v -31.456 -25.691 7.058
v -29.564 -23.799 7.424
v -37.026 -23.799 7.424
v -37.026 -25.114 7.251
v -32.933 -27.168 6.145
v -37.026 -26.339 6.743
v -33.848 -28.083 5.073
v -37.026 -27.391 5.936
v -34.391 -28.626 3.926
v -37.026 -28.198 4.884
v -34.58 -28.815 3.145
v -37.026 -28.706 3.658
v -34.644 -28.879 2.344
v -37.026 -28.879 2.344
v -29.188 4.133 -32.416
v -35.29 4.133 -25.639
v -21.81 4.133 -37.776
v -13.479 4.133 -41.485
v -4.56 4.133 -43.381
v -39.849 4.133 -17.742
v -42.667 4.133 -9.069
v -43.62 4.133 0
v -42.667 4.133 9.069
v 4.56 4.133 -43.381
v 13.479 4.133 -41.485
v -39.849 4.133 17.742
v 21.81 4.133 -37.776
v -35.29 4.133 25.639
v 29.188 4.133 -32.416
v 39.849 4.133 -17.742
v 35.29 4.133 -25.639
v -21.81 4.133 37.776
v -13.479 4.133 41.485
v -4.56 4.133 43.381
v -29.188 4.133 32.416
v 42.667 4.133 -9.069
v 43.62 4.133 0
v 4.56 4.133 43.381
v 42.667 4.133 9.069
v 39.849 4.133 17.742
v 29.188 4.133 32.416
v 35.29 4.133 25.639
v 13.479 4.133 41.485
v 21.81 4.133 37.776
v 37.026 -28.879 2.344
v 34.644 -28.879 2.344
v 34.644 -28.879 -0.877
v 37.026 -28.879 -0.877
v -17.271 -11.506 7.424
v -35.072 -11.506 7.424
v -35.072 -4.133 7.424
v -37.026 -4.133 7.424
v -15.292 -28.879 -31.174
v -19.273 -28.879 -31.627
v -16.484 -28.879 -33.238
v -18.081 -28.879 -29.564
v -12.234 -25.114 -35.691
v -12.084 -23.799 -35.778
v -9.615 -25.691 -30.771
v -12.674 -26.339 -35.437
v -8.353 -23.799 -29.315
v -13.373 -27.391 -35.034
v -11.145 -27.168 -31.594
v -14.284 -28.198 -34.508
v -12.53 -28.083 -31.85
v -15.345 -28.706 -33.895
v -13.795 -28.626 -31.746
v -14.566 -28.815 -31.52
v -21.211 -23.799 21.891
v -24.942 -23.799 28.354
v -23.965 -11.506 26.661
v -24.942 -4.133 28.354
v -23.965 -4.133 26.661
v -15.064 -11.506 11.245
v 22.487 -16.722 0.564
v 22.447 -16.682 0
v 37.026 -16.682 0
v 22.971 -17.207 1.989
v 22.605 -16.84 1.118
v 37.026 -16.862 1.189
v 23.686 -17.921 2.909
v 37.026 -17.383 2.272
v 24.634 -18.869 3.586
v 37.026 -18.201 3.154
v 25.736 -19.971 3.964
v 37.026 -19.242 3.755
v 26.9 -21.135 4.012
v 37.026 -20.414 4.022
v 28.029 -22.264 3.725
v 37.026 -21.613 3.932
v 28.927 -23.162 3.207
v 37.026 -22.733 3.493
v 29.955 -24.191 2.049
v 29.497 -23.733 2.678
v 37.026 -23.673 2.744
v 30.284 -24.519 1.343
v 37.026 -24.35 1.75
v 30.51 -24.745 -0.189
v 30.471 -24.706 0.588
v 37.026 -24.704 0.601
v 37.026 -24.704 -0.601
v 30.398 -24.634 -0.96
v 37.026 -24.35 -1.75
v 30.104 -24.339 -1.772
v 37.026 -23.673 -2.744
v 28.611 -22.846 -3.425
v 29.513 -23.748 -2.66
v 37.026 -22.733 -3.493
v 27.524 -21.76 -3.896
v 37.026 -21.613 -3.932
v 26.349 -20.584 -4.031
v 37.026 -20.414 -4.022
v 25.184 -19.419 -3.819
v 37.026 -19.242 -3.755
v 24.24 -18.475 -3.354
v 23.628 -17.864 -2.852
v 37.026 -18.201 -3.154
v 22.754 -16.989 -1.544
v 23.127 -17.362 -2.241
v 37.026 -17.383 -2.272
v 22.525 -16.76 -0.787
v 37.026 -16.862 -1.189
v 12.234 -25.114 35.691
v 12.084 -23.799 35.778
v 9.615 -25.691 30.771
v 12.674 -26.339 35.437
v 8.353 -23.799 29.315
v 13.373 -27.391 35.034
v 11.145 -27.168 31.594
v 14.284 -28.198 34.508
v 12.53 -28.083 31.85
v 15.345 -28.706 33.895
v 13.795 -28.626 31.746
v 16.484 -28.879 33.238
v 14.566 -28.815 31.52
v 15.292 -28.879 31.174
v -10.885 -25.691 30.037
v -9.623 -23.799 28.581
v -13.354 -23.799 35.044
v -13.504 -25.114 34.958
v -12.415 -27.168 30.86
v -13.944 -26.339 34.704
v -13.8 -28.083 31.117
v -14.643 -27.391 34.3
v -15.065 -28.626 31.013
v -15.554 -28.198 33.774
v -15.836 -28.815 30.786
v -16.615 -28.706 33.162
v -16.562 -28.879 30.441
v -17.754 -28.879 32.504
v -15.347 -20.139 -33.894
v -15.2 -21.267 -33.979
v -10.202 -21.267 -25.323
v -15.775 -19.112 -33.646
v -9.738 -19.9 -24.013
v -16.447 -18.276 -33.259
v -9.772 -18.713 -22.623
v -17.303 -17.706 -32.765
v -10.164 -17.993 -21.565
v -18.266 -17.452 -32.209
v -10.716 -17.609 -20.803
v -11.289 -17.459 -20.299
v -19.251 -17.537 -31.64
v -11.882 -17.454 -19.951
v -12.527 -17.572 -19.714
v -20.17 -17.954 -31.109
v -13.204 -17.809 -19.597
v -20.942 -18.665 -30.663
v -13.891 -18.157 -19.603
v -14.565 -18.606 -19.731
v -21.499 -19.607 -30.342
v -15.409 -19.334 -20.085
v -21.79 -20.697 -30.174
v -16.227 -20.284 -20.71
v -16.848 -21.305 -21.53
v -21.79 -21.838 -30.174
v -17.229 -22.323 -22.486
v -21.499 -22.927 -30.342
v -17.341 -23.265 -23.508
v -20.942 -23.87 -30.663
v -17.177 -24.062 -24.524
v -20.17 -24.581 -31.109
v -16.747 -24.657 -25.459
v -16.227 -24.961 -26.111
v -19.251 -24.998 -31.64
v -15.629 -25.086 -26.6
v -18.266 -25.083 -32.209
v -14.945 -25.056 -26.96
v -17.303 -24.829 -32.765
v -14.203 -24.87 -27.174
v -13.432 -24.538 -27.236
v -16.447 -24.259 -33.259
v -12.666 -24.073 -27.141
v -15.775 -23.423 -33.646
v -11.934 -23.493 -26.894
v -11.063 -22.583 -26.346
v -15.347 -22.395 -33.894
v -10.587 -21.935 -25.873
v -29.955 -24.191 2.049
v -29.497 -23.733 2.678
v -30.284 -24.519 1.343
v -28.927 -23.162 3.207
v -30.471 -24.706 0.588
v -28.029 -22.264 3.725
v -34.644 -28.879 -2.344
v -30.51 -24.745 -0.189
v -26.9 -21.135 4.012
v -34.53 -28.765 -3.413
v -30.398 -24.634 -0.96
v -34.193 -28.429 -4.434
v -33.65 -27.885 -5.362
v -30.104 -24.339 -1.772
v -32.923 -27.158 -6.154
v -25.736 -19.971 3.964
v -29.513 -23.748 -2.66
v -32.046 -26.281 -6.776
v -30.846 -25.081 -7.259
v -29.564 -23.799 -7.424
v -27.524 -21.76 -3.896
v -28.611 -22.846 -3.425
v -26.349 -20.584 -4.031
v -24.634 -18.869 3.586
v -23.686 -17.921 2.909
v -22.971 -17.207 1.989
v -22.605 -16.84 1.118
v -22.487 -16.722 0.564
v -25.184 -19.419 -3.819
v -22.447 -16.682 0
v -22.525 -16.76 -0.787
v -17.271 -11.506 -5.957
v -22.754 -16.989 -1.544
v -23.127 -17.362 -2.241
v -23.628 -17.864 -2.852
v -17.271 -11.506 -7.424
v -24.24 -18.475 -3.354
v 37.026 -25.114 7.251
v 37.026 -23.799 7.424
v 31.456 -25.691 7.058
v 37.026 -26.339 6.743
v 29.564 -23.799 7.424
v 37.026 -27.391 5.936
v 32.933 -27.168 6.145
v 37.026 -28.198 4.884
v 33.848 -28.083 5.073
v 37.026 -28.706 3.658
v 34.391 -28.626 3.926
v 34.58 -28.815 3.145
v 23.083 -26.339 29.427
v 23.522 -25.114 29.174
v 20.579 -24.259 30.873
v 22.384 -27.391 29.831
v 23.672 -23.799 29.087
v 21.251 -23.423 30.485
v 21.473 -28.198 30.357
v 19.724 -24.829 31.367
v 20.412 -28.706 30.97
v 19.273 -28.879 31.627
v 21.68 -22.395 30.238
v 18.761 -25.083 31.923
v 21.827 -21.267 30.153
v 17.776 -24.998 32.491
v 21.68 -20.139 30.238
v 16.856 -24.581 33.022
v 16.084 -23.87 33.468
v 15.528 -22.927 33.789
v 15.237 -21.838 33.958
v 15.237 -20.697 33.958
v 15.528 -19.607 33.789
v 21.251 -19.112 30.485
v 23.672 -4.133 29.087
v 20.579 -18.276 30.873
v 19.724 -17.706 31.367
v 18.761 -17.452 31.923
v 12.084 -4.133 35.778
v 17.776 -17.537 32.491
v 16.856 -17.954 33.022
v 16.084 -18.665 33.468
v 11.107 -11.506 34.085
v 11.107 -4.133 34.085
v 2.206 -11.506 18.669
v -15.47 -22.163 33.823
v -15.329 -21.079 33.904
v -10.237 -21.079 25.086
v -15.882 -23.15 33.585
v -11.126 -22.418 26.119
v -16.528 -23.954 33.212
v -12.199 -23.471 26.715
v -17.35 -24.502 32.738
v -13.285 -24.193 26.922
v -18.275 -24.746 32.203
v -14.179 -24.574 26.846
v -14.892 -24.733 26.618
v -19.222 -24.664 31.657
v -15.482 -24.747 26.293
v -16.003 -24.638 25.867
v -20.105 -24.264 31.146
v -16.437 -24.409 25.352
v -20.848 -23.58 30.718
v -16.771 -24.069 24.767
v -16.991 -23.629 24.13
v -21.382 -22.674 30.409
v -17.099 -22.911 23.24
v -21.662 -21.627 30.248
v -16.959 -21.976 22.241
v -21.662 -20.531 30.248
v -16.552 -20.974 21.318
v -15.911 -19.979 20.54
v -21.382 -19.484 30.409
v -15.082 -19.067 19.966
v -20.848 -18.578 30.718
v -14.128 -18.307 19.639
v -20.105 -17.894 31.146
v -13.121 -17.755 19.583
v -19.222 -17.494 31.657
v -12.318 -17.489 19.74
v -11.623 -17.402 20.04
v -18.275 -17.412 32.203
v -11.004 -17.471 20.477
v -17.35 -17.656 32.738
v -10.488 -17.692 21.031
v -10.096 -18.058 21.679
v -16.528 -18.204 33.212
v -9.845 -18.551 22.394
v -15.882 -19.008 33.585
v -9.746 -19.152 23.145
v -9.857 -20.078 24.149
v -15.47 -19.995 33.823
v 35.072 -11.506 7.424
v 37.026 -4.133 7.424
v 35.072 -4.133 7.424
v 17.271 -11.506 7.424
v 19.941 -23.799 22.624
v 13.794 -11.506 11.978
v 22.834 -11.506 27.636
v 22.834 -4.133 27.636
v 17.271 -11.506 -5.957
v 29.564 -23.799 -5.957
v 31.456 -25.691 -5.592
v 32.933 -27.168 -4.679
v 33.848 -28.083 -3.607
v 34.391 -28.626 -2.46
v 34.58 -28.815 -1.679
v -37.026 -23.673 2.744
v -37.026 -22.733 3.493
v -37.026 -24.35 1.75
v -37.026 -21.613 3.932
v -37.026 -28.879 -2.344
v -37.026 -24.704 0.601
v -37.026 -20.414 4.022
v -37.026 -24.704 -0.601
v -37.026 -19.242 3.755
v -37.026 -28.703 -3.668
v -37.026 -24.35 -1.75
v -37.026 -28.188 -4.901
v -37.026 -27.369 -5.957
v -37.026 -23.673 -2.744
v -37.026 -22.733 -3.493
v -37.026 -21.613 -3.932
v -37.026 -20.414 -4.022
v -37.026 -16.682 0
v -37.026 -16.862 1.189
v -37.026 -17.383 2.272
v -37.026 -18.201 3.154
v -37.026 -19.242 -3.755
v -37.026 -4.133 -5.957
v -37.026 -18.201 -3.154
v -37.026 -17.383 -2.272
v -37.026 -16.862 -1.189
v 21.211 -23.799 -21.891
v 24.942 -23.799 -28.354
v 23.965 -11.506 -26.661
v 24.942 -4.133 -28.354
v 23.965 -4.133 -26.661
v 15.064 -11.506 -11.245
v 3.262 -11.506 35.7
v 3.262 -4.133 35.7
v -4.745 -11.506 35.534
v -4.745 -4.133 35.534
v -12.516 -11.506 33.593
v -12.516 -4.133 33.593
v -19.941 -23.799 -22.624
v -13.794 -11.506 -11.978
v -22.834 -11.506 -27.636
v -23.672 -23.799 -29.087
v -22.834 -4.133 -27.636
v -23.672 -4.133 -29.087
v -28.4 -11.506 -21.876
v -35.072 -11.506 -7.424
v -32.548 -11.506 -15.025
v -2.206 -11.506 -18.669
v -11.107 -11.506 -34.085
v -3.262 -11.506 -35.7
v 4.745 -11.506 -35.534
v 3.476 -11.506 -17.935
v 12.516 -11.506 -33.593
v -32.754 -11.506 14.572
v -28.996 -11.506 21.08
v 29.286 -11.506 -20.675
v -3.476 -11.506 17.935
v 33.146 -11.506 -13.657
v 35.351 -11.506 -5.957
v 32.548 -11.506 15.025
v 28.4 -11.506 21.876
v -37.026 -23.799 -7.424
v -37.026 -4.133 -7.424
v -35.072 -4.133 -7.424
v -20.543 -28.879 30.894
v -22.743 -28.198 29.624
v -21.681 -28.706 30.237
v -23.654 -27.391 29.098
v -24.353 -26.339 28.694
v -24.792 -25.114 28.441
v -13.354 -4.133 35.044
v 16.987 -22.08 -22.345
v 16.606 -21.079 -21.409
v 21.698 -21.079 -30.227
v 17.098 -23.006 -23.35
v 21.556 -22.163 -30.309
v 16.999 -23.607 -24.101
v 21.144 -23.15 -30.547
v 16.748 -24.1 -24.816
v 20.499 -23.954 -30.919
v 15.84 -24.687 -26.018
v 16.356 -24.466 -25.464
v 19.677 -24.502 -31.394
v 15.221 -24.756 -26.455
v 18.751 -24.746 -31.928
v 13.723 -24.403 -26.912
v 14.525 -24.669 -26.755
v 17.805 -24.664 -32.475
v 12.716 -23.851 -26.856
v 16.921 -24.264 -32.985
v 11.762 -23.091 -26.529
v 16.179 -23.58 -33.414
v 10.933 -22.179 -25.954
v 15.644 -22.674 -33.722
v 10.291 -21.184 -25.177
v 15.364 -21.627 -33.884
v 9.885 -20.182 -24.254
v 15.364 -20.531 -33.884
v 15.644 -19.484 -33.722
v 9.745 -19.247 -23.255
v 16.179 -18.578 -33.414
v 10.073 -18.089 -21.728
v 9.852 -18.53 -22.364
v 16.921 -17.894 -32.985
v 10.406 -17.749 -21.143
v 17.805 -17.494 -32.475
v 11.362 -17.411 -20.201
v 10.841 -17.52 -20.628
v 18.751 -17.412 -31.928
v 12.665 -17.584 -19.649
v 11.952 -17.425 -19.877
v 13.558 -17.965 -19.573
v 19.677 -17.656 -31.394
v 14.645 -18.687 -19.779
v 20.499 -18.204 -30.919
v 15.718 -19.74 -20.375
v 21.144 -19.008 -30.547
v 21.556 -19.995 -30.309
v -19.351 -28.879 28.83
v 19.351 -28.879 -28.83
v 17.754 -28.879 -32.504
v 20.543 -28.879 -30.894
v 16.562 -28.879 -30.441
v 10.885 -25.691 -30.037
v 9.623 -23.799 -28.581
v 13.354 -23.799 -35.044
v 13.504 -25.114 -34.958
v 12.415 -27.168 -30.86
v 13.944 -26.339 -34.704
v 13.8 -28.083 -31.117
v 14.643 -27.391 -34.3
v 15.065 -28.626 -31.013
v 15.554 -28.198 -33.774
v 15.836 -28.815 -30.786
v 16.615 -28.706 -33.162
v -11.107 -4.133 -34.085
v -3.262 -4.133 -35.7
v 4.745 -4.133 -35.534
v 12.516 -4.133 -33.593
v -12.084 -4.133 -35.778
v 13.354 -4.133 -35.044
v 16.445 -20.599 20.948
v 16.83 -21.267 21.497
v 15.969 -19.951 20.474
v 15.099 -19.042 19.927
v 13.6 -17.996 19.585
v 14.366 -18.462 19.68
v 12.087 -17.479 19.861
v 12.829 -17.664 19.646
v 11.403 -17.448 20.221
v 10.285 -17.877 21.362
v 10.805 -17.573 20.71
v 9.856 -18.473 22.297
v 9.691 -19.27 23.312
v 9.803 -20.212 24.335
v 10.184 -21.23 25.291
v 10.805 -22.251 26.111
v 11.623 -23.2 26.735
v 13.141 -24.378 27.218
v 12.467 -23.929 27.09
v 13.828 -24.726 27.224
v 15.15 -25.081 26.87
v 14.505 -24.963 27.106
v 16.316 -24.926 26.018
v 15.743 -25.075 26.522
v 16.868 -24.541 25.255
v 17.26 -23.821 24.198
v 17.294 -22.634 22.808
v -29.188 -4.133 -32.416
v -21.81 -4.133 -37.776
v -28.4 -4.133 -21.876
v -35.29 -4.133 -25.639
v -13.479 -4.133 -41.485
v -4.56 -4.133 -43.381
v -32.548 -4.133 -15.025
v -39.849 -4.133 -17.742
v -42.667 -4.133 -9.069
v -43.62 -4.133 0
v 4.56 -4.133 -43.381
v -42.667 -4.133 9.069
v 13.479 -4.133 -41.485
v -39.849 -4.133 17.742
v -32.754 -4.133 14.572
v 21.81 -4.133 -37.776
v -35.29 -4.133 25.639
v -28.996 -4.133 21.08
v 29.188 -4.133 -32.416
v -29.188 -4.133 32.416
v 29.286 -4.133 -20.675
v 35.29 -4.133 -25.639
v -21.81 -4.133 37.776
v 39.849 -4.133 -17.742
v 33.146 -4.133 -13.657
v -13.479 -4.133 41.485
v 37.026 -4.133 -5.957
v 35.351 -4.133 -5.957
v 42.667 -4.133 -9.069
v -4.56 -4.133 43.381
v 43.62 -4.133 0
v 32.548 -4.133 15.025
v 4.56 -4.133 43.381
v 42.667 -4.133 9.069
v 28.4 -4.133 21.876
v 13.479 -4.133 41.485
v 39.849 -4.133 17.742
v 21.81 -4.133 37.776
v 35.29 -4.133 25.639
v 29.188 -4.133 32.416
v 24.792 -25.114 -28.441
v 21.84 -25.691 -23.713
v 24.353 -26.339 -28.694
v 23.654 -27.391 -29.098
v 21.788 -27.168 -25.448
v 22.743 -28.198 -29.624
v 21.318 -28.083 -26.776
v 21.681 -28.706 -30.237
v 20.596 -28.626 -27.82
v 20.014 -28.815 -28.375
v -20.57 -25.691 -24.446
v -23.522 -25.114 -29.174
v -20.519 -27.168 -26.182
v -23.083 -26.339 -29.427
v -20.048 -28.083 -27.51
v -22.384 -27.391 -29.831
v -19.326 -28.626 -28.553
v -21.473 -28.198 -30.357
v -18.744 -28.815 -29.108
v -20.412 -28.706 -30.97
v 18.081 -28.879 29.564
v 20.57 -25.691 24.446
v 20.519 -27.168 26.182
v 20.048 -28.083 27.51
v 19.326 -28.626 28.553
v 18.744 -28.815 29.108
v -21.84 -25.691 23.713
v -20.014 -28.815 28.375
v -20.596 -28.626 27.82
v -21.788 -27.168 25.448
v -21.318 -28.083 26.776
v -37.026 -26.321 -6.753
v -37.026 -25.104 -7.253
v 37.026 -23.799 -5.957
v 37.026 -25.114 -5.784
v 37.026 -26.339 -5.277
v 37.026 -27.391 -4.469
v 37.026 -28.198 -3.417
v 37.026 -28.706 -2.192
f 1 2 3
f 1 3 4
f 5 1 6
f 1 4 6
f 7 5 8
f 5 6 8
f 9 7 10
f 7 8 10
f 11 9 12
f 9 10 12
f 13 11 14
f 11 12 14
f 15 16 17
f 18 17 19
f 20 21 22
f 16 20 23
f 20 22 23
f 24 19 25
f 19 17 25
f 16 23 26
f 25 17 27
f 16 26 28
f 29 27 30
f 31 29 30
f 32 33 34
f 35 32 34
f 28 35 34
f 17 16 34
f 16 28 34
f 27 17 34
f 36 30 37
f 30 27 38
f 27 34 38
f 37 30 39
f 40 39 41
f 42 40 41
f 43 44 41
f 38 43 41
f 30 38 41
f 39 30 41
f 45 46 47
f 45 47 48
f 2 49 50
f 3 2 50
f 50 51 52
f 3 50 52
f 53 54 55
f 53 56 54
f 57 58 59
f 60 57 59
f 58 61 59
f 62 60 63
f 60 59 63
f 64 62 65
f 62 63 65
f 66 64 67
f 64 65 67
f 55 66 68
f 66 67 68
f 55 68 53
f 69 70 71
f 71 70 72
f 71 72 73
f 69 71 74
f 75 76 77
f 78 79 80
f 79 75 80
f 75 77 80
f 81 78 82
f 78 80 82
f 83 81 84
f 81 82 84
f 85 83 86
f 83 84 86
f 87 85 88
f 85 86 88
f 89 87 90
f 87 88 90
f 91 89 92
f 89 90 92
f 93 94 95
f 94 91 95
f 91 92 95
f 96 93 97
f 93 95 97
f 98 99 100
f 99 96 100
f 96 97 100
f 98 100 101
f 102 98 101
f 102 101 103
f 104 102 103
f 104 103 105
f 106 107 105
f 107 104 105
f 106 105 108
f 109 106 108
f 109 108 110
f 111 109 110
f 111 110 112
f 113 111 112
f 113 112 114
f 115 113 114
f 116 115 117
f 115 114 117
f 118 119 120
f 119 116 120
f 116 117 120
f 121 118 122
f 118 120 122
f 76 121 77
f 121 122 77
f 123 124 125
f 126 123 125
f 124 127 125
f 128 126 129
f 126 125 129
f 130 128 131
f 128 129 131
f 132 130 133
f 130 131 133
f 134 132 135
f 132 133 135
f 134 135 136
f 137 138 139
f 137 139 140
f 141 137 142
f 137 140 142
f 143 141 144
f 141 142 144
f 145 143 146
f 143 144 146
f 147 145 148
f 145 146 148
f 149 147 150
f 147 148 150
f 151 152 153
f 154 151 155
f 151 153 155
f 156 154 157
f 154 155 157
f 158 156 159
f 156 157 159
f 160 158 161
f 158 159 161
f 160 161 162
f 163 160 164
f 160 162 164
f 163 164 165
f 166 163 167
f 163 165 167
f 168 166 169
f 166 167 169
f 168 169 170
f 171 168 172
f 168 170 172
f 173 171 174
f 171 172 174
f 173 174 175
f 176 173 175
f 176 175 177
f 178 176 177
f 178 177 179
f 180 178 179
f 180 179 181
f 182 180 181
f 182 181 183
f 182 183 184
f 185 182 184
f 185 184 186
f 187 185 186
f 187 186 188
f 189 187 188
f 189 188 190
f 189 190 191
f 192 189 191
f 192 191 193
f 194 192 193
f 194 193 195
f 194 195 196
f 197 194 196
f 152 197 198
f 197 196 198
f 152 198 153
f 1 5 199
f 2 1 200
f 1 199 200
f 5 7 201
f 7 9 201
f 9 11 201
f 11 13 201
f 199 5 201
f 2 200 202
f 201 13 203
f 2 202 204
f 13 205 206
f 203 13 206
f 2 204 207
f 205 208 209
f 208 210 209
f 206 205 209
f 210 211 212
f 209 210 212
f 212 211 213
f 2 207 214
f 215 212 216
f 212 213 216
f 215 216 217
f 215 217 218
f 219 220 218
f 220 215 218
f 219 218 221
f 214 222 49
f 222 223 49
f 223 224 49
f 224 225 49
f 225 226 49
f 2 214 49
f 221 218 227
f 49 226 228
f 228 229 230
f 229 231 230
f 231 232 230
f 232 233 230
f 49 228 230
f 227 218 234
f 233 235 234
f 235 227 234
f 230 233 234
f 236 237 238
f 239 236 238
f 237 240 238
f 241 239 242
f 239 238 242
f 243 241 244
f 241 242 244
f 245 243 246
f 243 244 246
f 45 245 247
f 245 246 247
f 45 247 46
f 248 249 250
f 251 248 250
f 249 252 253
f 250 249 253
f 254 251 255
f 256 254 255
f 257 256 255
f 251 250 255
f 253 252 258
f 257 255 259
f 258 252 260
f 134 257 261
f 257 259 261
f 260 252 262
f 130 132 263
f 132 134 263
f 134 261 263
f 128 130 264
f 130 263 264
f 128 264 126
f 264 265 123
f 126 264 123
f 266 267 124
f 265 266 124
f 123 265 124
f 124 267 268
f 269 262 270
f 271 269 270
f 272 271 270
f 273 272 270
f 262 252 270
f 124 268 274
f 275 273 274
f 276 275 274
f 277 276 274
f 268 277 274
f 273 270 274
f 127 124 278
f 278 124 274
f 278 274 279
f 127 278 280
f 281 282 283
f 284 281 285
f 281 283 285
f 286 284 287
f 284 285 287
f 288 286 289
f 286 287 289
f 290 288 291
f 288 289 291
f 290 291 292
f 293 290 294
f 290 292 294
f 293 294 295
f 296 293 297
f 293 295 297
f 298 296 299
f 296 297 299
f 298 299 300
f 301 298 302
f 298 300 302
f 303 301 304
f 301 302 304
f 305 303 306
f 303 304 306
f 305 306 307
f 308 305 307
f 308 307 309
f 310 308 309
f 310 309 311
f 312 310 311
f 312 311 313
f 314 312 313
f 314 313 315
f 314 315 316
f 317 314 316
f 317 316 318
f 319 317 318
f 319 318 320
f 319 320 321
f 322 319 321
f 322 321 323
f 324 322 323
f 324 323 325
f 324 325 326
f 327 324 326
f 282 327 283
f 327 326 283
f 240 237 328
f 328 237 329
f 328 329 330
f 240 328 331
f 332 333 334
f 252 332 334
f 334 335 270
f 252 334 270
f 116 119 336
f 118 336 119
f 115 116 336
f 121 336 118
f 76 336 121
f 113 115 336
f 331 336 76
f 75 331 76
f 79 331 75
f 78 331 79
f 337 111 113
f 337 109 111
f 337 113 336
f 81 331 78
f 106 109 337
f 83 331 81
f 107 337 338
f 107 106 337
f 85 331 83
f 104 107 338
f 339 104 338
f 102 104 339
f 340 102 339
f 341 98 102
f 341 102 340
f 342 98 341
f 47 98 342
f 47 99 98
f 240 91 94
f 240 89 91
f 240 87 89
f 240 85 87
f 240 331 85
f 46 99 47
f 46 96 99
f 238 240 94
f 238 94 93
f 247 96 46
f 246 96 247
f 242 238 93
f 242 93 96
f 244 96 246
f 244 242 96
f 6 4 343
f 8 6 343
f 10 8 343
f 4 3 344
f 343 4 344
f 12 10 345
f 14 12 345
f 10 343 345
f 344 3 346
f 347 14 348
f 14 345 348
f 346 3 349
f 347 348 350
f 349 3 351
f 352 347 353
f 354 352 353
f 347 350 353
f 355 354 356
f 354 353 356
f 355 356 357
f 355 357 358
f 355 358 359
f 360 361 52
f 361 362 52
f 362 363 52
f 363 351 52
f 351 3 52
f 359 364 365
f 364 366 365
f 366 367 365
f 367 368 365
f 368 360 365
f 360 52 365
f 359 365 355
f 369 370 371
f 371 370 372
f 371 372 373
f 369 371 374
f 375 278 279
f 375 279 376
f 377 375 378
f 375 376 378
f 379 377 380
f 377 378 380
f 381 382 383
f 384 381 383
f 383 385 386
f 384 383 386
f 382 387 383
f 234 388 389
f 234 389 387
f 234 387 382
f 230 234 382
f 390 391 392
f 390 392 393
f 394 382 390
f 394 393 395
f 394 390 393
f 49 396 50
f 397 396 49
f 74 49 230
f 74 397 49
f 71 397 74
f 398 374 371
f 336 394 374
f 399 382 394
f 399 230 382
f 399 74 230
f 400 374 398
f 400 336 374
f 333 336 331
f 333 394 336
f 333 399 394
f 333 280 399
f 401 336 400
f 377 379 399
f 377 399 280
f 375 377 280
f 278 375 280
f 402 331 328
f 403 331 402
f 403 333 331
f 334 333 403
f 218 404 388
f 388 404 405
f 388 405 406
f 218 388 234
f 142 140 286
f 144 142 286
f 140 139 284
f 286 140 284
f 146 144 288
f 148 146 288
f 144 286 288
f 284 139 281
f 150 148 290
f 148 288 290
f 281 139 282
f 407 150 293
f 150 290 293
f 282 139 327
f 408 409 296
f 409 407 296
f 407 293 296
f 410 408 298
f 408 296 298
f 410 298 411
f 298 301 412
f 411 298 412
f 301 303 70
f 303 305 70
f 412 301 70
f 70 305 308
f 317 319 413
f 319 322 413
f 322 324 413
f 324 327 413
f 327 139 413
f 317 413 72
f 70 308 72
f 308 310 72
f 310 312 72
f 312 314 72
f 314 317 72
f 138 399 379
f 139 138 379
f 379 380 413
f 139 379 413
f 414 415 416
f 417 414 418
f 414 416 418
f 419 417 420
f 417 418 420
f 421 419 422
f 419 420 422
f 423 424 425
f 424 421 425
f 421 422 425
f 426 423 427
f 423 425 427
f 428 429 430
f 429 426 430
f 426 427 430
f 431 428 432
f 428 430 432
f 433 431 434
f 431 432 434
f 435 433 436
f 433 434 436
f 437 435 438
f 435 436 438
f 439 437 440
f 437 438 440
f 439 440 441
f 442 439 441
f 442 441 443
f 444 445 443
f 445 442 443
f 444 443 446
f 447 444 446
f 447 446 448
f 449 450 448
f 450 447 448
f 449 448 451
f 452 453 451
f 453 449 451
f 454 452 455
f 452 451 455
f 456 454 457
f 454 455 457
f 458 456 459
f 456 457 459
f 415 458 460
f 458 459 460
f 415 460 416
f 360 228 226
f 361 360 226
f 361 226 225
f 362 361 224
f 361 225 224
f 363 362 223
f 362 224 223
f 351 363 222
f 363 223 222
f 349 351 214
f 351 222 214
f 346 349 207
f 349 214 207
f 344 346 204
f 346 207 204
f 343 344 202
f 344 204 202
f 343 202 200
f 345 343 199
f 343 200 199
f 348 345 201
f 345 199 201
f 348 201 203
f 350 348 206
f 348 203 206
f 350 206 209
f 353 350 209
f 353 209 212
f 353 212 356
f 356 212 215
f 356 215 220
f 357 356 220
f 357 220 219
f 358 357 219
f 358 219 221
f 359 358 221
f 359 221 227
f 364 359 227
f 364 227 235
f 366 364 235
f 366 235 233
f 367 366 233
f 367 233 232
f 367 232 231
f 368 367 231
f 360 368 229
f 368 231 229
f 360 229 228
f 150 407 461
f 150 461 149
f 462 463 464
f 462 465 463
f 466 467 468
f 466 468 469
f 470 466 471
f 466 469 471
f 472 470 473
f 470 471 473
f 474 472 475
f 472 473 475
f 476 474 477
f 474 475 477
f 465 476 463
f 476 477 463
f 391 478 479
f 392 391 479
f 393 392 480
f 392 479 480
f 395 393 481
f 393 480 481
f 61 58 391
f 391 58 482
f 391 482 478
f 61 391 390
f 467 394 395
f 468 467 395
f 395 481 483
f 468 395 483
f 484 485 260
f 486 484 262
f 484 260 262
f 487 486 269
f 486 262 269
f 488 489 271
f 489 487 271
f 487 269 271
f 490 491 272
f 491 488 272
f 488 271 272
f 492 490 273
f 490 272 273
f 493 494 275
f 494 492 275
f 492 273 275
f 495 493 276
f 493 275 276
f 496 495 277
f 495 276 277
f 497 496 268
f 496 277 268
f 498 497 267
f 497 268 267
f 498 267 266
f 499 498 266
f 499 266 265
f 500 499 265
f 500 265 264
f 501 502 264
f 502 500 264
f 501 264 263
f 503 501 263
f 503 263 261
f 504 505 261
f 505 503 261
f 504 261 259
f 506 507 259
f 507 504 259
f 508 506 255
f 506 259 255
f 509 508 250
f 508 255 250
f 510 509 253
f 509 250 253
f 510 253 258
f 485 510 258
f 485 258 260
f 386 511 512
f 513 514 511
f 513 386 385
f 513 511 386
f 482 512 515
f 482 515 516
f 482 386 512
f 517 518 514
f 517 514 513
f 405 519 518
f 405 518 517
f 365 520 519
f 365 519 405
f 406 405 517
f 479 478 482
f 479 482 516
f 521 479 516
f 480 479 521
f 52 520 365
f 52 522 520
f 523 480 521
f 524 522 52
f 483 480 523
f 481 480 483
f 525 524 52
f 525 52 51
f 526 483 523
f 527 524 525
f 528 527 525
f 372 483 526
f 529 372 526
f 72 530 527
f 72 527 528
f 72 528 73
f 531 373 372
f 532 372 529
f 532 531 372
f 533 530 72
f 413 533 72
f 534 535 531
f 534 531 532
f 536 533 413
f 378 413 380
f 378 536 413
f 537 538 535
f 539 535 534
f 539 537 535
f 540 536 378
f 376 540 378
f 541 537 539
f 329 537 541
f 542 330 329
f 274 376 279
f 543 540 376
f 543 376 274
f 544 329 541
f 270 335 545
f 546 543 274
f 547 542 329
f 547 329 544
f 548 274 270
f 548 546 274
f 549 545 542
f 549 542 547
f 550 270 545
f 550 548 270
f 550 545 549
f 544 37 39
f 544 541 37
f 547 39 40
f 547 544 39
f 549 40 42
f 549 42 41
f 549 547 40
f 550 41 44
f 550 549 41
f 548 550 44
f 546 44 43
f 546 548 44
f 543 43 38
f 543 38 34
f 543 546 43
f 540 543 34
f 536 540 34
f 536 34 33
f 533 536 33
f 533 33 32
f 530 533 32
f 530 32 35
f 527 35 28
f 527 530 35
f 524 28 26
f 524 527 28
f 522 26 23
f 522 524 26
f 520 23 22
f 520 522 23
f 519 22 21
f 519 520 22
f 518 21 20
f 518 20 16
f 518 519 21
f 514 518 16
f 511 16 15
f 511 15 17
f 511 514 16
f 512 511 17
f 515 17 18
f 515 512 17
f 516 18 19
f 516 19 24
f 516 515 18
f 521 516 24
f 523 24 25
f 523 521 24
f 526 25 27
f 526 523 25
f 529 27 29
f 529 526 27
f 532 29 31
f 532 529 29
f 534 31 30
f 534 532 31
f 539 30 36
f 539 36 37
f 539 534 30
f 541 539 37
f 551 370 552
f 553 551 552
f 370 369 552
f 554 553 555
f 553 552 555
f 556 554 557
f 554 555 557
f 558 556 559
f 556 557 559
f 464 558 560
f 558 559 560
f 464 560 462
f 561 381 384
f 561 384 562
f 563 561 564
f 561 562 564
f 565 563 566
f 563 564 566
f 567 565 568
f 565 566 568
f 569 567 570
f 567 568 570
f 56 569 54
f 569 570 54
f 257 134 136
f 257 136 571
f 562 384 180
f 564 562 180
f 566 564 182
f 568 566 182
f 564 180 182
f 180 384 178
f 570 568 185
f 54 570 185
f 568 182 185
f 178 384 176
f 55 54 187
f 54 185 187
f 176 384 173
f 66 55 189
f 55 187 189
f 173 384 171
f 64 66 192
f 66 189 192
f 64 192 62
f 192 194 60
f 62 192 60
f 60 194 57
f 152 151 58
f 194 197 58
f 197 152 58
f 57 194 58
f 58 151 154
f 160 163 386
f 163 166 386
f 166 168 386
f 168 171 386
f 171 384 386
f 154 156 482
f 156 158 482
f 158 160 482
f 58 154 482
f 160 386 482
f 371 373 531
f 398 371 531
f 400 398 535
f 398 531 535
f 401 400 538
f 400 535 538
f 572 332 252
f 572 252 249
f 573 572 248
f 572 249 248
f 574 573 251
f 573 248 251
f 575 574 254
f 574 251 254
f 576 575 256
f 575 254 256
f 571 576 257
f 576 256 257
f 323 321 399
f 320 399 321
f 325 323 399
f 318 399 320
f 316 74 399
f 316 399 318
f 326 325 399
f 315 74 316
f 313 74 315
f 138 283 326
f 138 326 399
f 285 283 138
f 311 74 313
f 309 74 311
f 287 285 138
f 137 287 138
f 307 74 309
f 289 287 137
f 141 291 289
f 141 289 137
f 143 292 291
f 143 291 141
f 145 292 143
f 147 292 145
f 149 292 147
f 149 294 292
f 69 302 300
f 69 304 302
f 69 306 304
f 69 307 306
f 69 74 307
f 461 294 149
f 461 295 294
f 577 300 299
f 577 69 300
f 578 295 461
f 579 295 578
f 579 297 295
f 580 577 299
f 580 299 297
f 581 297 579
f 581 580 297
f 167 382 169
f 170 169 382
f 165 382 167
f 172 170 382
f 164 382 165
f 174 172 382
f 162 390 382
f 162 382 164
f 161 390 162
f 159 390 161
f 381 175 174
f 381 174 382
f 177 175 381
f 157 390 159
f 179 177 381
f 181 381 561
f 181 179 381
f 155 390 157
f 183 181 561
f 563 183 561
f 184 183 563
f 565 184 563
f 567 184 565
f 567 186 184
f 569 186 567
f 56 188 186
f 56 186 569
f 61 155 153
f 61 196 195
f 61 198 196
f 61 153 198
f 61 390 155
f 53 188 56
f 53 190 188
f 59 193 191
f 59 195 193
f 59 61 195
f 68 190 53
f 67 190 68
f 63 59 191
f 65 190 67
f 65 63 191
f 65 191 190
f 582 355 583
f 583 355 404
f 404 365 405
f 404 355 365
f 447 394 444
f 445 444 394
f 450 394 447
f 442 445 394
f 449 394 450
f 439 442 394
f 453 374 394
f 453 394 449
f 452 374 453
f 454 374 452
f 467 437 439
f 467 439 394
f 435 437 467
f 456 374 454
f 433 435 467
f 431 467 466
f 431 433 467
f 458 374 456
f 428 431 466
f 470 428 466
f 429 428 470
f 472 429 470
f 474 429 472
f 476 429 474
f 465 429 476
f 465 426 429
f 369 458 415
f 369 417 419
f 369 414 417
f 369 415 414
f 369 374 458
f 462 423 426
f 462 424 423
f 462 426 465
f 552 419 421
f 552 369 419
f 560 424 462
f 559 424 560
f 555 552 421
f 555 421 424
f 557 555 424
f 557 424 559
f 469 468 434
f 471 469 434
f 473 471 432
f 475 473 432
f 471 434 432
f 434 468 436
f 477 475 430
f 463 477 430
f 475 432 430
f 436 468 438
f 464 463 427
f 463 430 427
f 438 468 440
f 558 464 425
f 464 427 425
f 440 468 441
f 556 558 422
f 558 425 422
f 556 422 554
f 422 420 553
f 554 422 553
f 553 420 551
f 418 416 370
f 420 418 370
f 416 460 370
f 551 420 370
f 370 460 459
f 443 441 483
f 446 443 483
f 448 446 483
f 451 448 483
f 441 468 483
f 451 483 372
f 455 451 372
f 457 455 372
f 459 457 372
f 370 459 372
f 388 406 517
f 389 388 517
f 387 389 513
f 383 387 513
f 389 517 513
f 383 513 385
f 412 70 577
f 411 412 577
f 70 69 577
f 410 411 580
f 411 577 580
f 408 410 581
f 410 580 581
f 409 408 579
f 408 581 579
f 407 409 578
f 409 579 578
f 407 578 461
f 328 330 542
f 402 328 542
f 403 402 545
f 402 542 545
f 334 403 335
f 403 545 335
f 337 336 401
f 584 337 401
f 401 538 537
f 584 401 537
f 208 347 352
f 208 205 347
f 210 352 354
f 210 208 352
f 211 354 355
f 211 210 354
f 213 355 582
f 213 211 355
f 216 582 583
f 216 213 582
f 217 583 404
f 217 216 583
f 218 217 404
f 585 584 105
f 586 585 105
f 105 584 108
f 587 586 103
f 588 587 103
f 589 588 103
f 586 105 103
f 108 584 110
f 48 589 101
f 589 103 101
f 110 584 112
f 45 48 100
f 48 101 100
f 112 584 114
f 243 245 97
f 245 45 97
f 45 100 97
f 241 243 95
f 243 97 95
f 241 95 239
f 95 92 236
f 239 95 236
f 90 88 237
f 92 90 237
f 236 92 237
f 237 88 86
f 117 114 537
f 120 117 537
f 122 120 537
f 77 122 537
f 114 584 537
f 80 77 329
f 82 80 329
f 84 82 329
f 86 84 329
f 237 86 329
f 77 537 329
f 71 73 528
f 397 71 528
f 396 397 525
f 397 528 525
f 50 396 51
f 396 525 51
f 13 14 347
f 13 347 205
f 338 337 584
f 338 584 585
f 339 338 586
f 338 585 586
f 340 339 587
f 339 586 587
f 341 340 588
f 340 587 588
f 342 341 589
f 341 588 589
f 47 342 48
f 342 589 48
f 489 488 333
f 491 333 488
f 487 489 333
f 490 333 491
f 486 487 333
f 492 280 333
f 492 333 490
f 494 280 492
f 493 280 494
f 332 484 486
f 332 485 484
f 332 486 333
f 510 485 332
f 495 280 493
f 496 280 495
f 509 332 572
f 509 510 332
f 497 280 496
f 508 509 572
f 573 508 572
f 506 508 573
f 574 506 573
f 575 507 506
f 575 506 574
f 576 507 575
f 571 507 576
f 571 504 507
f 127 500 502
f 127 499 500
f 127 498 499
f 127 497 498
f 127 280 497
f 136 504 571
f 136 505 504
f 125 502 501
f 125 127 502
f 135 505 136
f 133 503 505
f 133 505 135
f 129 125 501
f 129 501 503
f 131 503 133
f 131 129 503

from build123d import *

# Parameters (mm, degrees)
F0_R         = 43.6202450144
F1_DEPTH     = 4.13283
F2_R         = 35.8490091113
F3_DEPTH     = 7.373
F5_DEPTH     = 28.71845
F6_T4_DEPTH  = 13.3808250539
F6_T9_DEPTH  = 1.4663911018
F7_T4_DEPTH  = 13.3808250539
F8_DEPTH     = 28.87876
F9_T4_DEPTH  = 13.3808250539
F9_T9_DEPTH  = 13.3808250539
F9_T14_DEPTH = 13.3808250539
F9_T19_DEPTH = 1.4663911018
F9_T24_DEPTH = 13.3808250539
F9_T29_DEPTH = 13.3808250539
F9_T34_DEPTH = 13.3808250539
F10_R        = 5.08
F11_R        = 4.0335860218
F12_DEPTH    = 87.80528
F14_R        = 3.8261546388
F15_DEPTH    = 90.21009
F17_R        = 3.6772087236
F18_DEPTH    = 79.11967


# Not quite as in the source:
# - a fillet or chamfer that OpenCascade refuses, or shapes differently, is made with other operations: its cross-section is extruded or revolved along the edge and cut away or added


with BuildPart() as f1:
    # F0 (on Front) → F1 (new body, symmetric)
    with BuildSketch(Plane.XZ):
        Circle(F0_R)
    extrude(amount=F1_DEPTH, both=True)

    # F2 (on face) → F3 (join)
    with BuildSketch(Plane.XZ.offset(4.13283)):
        Circle(F2_R)
    extrude(amount=F3_DEPTH)

    # F4 (on Front) → F5 (join)
    with BuildSketch(Plane.XZ):
        Polygon((-16.8635044247, 7.4236080982), (-37.0263941586, 7.4236080982), (-37.0263941586, 5.957217045), (-37.0263941586, -5.9572169557), (-37.0263941765, -7.4236080089), (-16.8635044426, -7.4236080575), (-16.863504439, -5.9572169557), (-16.8635044247, -5.224020686), (-16.8635044247, 5.2240207266), (-16.8635044247, 5.9572169964), align=None)
        Polygon((37.0263941586, 7.4236080982), (16.8635044247, 7.4236080982), (16.8635044247, -5.224020686), (16.8635044247, -5.9572169557), (37.0263941586, -5.9572169557), align=None)
        Polygon((24.9422302573, -28.3539939228), (14.8607854044, -10.8924191915), (3.9076175745, -17.2162335748), (3.2726509787, -17.5828317091), (13.3540958316, -35.0444064405), align=None)
        Polygon((-12.084163936, -35.7776019816), (-2.002719041, -18.3160272745), (-12.9558868556, -11.9922128648), (-13.5908534505, -11.6256147289), (-23.6722983455, -29.087189436), align=None)
        Polygon((-24.9422301889, 28.3539939829), (-14.8607853781, 10.8924192273), (-3.907617533, 17.2162335842), (-3.2726509363, 17.582831717), (-13.3540957472, 35.0444064727), align=None)
        Polygon((12.0841640223, 35.7776019524), (2.0027190852, 18.3160272697), (12.9558868845, 11.9922128336), (13.5908534786, 11.6256146962), (23.6722984157, 29.0871893789), align=None)
    extrude(amount=F5_DEPTH)

    # F6: chamfer of 17.78 on 1 edges, made by hand


with BuildPart() as f6_tool2:
    # F6_s3 → F6_t4 (new body)
    with BuildSketch(Plane.XY.offset(-5.9572169557)):
        with BuildLine():
            Line((-35.1463987747, -29.2213443428), (-16.3606100891, -10.4355556572))
            Line((-16.3606100891, -10.4355556572), (-16.0050100891, -10.4355556572))
            ThreePointArc((-16.0050100891, -10.4355556572), (-16.5079044319, -19.5770028286), (-16.5079044319, -28.71845))
            Line((-16.5079044319, -28.71845), (-16.8635044319, -29.07405))
            ThreePointArc((-16.8635044319, -29.07405), (-26.0049516033, -29.07405), (-35.1463987747, -29.5769443428))
            Line((-35.1463987747, -29.5769443428), (-35.1463987747, -29.2213443428))
        make_face()
    extrude(amount=F6_T4_DEPTH)

    split(bisect_by=Plane.XZ.offset(11.50583), keep=Keep.TOP)


with BuildPart() as f1_1:
    add(f1.part)

    # F6_t1: cut F6_tool2
    add(f6_tool2.part, mode=Mode.SUBTRACT)


with BuildPart() as f6_tool7:
    # F6_s8 → F6_t9 (new body)
    with BuildSketch(Plane.XY.offset(-7.4236080575)):
        with BuildLine():
            Line((-35.1463987854, -29.2213443428), (-16.3606100998, -10.4355556572))
            Line((-16.3606100998, -10.4355556572), (-16.0050100998, -10.4355556572))
            ThreePointArc((-16.0050100998, -10.4355556572), (-16.5079044426, -19.5770028286), (-16.5079044426, -28.71845))
            Line((-16.5079044426, -28.71845), (-16.8635044426, -29.07405))
            ThreePointArc((-16.8635044426, -29.07405), (-26.004951614, -29.07405), (-35.1463987854, -29.5769443428))
            Line((-35.1463987854, -29.5769443428), (-35.1463987854, -29.2213443428))
        make_face()
    extrude(amount=F6_T9_DEPTH)

    split(bisect_by=Plane.XZ.offset(11.50583), keep=Keep.TOP)


with BuildPart() as f1_2:
    add(f1_1.part)

    # F6_t6: cut F6_tool7
    add(f6_tool7.part, mode=Mode.SUBTRACT)

    # F7: chamfer of 17.78 on 1 edges, made by hand


with BuildPart() as f7_tool2:
    # F7_s3 → F7_t4 (new body)
    with BuildSketch(Plane.XY.offset(7.4236080982)):
        with BuildLine():
            Line((35.1463987675, -29.2213443428), (16.3606100819, -10.4355556572))
            Line((16.3606100819, -10.4355556572), (16.0050100819, -10.4355556572))
            ThreePointArc((16.0050100819, -10.4355556572), (16.5079044247, -19.5770028286), (16.5079044247, -28.71845))
            Line((16.5079044247, -28.71845), (16.8635044247, -29.07405))
            ThreePointArc((16.8635044247, -29.07405), (26.0049515961, -29.07405), (35.1463987675, -29.5769443428))
            Line((35.1463987675, -29.5769443428), (35.1463987675, -29.2213443428))
        make_face()
    extrude(amount=-F7_T4_DEPTH)

    split(bisect_by=Plane.XZ.offset(11.50583), keep=Keep.TOP)


with BuildPart() as f1_3:
    add(f1_2.part)

    # F7_t1: cut F7_tool2
    add(f7_tool2.part, mode=Mode.SUBTRACT)

    # F4 (on Front) → F8 (join)
    with BuildSketch(Plane.XZ):
        Polygon((-16.8635044247, 7.4236080982), (-37.0263941586, 7.4236080982), (-37.0263941586, 5.957217045), (-37.0263941586, -5.9572169557), (-37.0263941765, -7.4236080089), (-16.8635044426, -7.4236080575), (-16.863504439, -5.9572169557), (-16.8635044247, -5.224020686), (-16.8635044247, 5.2240207266), (-16.8635044247, 5.9572169964), align=None)
        Polygon((37.0263941586, 7.4236080982), (16.8635044247, 7.4236080982), (16.8635044247, -5.224020686), (16.8635044247, -5.9572169557), (37.0263941586, -5.9572169557), align=None)
        Polygon((24.9422302573, -28.3539939228), (14.8607854044, -10.8924191915), (3.9076175745, -17.2162335748), (3.2726509787, -17.5828317091), (13.3540958316, -35.0444064405), align=None)
        Polygon((-12.084163936, -35.7776019816), (-2.002719041, -18.3160272745), (-12.9558868556, -11.9922128648), (-13.5908534505, -11.6256147289), (-23.6722983455, -29.087189436), align=None)
        Polygon((-24.9422301889, 28.3539939829), (-14.8607853781, 10.8924192273), (-3.907617533, 17.2162335842), (-3.2726509363, 17.582831717), (-13.3540957472, 35.0444064727), align=None)
        Polygon((12.0841640223, 35.7776019524), (2.0027190852, 18.3160272697), (12.9558868845, 11.9922128336), (13.5908534786, 11.6256146962), (23.6722984157, 29.0871893789), align=None)
    extrude(amount=F8_DEPTH)

    # F9: chamfer of 17.78 on 7 edges, made by hand


with BuildPart() as f9_tool2:
    # F9_s3 → F9_t4 (new body)
    with BuildSketch(Plane(origin=(-6.4290331859, 0, 3.7118040749), x_dir=(0, 1, 0), z_dir=(0.8660254018, 0, -0.5000000035))):
        with BuildLine():
            Line((-10.5958656572, 16.3606100819), (-29.3816543428, 35.1463987675))
            Line((-29.3816543428, 35.1463987675), (-29.7372543428, 35.1463987675))
            ThreePointArc((-29.7372543428, 35.1463987675), (-29.23436, 26.0049515961), (-29.23436, 16.8635044247))
            Line((-29.23436, 16.8635044247), (-28.87876, 16.5079044247))
            ThreePointArc((-28.87876, 16.5079044247), (-19.7373128286, 16.5079044247), (-10.5958656572, 16.0050100819))
            Line((-10.5958656572, 16.0050100819), (-10.5958656572, 16.3606100819))
        make_face()
    extrude(amount=F9_T4_DEPTH)

    split(bisect_by=Plane.XZ.offset(11.50583), keep=Keep.TOP)


with BuildPart() as f1_4:
    add(f1_3.part)

    # F9_t1: cut F9_tool2
    add(f9_tool2.part, mode=Mode.SUBTRACT)


with BuildPart() as f9_tool7:
    # F9_s8 → F9_t9 (new body)
    with BuildSketch(Plane(origin=(-6.4290332127, 0, -3.7118040284), x_dir=(0, 1, 0), z_dir=(0.8660254054, 0, 0.4999999972))):
        with BuildLine():
            Line((-10.5958656572, 16.3606100819), (-29.3816543428, 35.1463987675))
            Line((-29.3816543428, 35.1463987675), (-29.7372543428, 35.1463987675))
            ThreePointArc((-29.7372543428, 35.1463987675), (-29.23436, 26.0049515961), (-29.23436, 16.8635044247))
            Line((-29.23436, 16.8635044247), (-28.87876, 16.5079044247))
            ThreePointArc((-28.87876, 16.5079044247), (-19.7373128286, 16.5079044247), (-10.5958656572, 16.0050100819))
            Line((-10.5958656572, 16.0050100819), (-10.5958656572, 16.3606100819))
        make_face()
    extrude(amount=F9_T9_DEPTH)

    split(bisect_by=Plane.XZ.offset(11.50583), keep=Keep.TOP)


with BuildPart() as f1_5:
    add(f1_4.part)

    # F9_t6: cut F9_tool7
    add(f9_tool7.part, mode=Mode.SUBTRACT)


with BuildPart() as f9_tool12:
    # F9_s13 → F9_t14 (new body)
    with BuildSketch(Plane.XY.offset(-5.9572169557)):
        with BuildLine():
            Line((-35.1463987747, -29.3816543428), (-16.3606100891, -10.5958656572))
            Line((-16.3606100891, -10.5958656572), (-16.0050100891, -10.5958656572))
            ThreePointArc((-16.0050100891, -10.5958656572), (-16.5079044319, -19.7373128286), (-16.5079044319, -28.87876))
            Line((-16.5079044319, -28.87876), (-16.8635044319, -29.23436))
            ThreePointArc((-16.8635044319, -29.23436), (-26.0049516033, -29.23436), (-35.1463987747, -29.7372543428))
            Line((-35.1463987747, -29.7372543428), (-35.1463987747, -29.3816543428))
        make_face()
    extrude(amount=F9_T14_DEPTH)

    split(bisect_by=Plane.XZ.offset(11.50583), keep=Keep.TOP)


with BuildPart() as f1_6:
    add(f1_5.part)

    # F9_t11: cut F9_tool12
    add(f9_tool12.part, mode=Mode.SUBTRACT)


with BuildPart() as f9_tool17:
    # F9_s18 → F9_t19 (new body)
    with BuildSketch(Plane.XY.offset(-7.4236080575)):
        with BuildLine():
            Line((-16.3606100998, -10.5958656572), (-35.1463987854, -29.3816543428))
            Line((-35.1463987854, -29.3816543428), (-35.1463987854, -29.7372543428))
            ThreePointArc((-35.1463987854, -29.7372543428), (-26.004951614, -29.23436), (-16.8635044426, -29.23436))
            Line((-16.8635044426, -29.23436), (-16.5079044426, -28.87876))
            ThreePointArc((-16.5079044426, -28.87876), (-16.5079044426, -19.7373128286), (-16.0050100998, -10.5958656572))
            Line((-16.0050100998, -10.5958656572), (-16.3606100998, -10.5958656572))
        make_face()
    extrude(amount=F9_T19_DEPTH)

    split(bisect_by=Plane.XZ.offset(11.50583), keep=Keep.TOP)


with BuildPart() as f1_7:
    add(f1_6.part)

    # F9_t16: cut F9_tool17
    add(f9_tool17.part, mode=Mode.SUBTRACT)


with BuildPart() as f9_tool22:
    # F9_s23 → F9_t24 (new body)
    with BuildSketch(Plane(origin=(6.4290331948, 0, -3.7118040594), x_dir=(0, 1, 0), z_dir=(-0.866025403, 0, 0.5000000014))):
        with BuildLine():
            Line((-10.5958656572, 16.3606100819), (-29.3816543428, 35.1463987675))
            Line((-29.3816543428, 35.1463987675), (-29.7372543428, 35.1463987675))
            ThreePointArc((-29.7372543428, 35.1463987675), (-29.23436, 26.0049515961), (-29.23436, 16.8635044247))
            Line((-29.23436, 16.8635044247), (-28.87876, 16.5079044247))
            ThreePointArc((-28.87876, 16.5079044247), (-19.7373128286, 16.5079044247), (-10.5958656572, 16.0050100819))
            Line((-10.5958656572, 16.0050100819), (-10.5958656572, 16.3606100819))
        make_face()
    extrude(amount=F9_T24_DEPTH)

    split(bisect_by=Plane.XZ.offset(11.50583), keep=Keep.TOP)


with BuildPart() as f1_8:
    add(f1_7.part)

    # F9_t21: cut F9_tool22
    add(f9_tool22.part, mode=Mode.SUBTRACT)


with BuildPart() as f9_tool27:
    # F9_s28 → F9_t29 (new body)
    with BuildSketch(Plane(origin=(6.4290332037, 0, 3.7118040439), x_dir=(0, 1, 0), z_dir=(-0.8660254042, 0, -0.4999999993))):
        with BuildLine():
            Line((-10.5958656572, 16.3606100819), (-29.3816543428, 35.1463987675))
            Line((-29.3816543428, 35.1463987675), (-29.7372543428, 35.1463987675))
            ThreePointArc((-29.7372543428, 35.1463987675), (-29.23436, 26.0049515961), (-29.23436, 16.8635044247))
            Line((-29.23436, 16.8635044247), (-28.87876, 16.5079044247))
            ThreePointArc((-28.87876, 16.5079044247), (-19.7373128286, 16.5079044247), (-10.5958656572, 16.0050100819))
            Line((-10.5958656572, 16.0050100819), (-10.5958656572, 16.3606100819))
        make_face()
    extrude(amount=F9_T29_DEPTH)

    split(bisect_by=Plane.XZ.offset(11.50583), keep=Keep.TOP)


with BuildPart() as f1_9:
    add(f1_8.part)

    # F9_t26: cut F9_tool27
    add(f9_tool27.part, mode=Mode.SUBTRACT)


with BuildPart() as f9_tool32:
    # F9_s33 → F9_t34 (new body)
    with BuildSketch(Plane.XY.offset(7.4236080982)):
        with BuildLine():
            Line((16.3606100819, -10.5958656572), (35.1463987675, -29.3816543428))
            Line((35.1463987675, -29.3816543428), (35.1463987675, -29.7372543428))
            ThreePointArc((35.1463987675, -29.7372543428), (26.0049515961, -29.23436), (16.8635044247, -29.23436))
            Line((16.8635044247, -29.23436), (16.5079044247, -28.87876))
            ThreePointArc((16.5079044247, -28.87876), (16.5079044247, -19.7373128286), (16.0050100819, -10.5958656572))
            Line((16.0050100819, -10.5958656572), (16.3606100819, -10.5958656572))
        make_face()
    extrude(amount=-F9_T34_DEPTH)

    split(bisect_by=Plane.XZ.offset(11.50583), keep=Keep.TOP)


with BuildPart() as f1_10:
    add(f1_9.part)

    # F9_t31: cut F9_tool32
    add(f9_tool32.part, mode=Mode.SUBTRACT)

    # F10
    f10_edges = [f1_10.edges().sort_by_distance(p)[0] for p in [
        (12.758373, -28.87876, -34.012585),
        (24.346508, -28.87876, -27.322172),
        (-11.488442, -28.87876, -34.74578),
        (-23.076576, -28.87876, -28.055368),
        (-35.834949, -28.87876, -7.423608),
        (-35.834949, -28.87876, 7.423608),
        (35.834949, -28.87876, 7.423608),
        (35.834949, -28.87876, -5.957217),
        (23.076576, -28.87876, 28.055368),
        (11.488442, -28.87876, 34.74578),
        (-24.346508, -28.87876, 27.322172),
        (-12.758373, -28.87876, 34.012585),
    ]]
    fillet(f10_edges, radius=F10_R)

    # F11 (on face) → F12 (cut)
    with BuildSketch(Plane.YZ.offset(37.0263941586)):
        with Locations((-20.7159072161, 0)):
            Circle(F11_R)
    extrude(amount=-F12_DEPTH, mode=Mode.SUBTRACT)

    # F14 (on face) → F15 (cut)
    with BuildSketch(Plane(origin=(18.5131972081, 0, 32.0657978775), x_dir=(0.8660254018, 0, -0.5000000035), z_dir=(0.5000000035, 0, 0.8660254018))):
        with Locations((0, -21.2672781199)):
            Circle(F14_R)
    extrude(amount=-F15_DEPTH, mode=Mode.SUBTRACT)

    # F17 (on face) → F18 (cut)
    with BuildSketch(Plane(origin=(18.5131970535, 0, -32.0657979668), x_dir=(0.8660254042, 0, 0.4999999993), z_dir=(0.4999999993, 0, -0.8660254042))):
        with Locations((0, 21.0790149868)):
            Circle(F17_R)
    extrude(amount=-F18_DEPTH, mode=Mode.SUBTRACT)


solid = f1_10.part
